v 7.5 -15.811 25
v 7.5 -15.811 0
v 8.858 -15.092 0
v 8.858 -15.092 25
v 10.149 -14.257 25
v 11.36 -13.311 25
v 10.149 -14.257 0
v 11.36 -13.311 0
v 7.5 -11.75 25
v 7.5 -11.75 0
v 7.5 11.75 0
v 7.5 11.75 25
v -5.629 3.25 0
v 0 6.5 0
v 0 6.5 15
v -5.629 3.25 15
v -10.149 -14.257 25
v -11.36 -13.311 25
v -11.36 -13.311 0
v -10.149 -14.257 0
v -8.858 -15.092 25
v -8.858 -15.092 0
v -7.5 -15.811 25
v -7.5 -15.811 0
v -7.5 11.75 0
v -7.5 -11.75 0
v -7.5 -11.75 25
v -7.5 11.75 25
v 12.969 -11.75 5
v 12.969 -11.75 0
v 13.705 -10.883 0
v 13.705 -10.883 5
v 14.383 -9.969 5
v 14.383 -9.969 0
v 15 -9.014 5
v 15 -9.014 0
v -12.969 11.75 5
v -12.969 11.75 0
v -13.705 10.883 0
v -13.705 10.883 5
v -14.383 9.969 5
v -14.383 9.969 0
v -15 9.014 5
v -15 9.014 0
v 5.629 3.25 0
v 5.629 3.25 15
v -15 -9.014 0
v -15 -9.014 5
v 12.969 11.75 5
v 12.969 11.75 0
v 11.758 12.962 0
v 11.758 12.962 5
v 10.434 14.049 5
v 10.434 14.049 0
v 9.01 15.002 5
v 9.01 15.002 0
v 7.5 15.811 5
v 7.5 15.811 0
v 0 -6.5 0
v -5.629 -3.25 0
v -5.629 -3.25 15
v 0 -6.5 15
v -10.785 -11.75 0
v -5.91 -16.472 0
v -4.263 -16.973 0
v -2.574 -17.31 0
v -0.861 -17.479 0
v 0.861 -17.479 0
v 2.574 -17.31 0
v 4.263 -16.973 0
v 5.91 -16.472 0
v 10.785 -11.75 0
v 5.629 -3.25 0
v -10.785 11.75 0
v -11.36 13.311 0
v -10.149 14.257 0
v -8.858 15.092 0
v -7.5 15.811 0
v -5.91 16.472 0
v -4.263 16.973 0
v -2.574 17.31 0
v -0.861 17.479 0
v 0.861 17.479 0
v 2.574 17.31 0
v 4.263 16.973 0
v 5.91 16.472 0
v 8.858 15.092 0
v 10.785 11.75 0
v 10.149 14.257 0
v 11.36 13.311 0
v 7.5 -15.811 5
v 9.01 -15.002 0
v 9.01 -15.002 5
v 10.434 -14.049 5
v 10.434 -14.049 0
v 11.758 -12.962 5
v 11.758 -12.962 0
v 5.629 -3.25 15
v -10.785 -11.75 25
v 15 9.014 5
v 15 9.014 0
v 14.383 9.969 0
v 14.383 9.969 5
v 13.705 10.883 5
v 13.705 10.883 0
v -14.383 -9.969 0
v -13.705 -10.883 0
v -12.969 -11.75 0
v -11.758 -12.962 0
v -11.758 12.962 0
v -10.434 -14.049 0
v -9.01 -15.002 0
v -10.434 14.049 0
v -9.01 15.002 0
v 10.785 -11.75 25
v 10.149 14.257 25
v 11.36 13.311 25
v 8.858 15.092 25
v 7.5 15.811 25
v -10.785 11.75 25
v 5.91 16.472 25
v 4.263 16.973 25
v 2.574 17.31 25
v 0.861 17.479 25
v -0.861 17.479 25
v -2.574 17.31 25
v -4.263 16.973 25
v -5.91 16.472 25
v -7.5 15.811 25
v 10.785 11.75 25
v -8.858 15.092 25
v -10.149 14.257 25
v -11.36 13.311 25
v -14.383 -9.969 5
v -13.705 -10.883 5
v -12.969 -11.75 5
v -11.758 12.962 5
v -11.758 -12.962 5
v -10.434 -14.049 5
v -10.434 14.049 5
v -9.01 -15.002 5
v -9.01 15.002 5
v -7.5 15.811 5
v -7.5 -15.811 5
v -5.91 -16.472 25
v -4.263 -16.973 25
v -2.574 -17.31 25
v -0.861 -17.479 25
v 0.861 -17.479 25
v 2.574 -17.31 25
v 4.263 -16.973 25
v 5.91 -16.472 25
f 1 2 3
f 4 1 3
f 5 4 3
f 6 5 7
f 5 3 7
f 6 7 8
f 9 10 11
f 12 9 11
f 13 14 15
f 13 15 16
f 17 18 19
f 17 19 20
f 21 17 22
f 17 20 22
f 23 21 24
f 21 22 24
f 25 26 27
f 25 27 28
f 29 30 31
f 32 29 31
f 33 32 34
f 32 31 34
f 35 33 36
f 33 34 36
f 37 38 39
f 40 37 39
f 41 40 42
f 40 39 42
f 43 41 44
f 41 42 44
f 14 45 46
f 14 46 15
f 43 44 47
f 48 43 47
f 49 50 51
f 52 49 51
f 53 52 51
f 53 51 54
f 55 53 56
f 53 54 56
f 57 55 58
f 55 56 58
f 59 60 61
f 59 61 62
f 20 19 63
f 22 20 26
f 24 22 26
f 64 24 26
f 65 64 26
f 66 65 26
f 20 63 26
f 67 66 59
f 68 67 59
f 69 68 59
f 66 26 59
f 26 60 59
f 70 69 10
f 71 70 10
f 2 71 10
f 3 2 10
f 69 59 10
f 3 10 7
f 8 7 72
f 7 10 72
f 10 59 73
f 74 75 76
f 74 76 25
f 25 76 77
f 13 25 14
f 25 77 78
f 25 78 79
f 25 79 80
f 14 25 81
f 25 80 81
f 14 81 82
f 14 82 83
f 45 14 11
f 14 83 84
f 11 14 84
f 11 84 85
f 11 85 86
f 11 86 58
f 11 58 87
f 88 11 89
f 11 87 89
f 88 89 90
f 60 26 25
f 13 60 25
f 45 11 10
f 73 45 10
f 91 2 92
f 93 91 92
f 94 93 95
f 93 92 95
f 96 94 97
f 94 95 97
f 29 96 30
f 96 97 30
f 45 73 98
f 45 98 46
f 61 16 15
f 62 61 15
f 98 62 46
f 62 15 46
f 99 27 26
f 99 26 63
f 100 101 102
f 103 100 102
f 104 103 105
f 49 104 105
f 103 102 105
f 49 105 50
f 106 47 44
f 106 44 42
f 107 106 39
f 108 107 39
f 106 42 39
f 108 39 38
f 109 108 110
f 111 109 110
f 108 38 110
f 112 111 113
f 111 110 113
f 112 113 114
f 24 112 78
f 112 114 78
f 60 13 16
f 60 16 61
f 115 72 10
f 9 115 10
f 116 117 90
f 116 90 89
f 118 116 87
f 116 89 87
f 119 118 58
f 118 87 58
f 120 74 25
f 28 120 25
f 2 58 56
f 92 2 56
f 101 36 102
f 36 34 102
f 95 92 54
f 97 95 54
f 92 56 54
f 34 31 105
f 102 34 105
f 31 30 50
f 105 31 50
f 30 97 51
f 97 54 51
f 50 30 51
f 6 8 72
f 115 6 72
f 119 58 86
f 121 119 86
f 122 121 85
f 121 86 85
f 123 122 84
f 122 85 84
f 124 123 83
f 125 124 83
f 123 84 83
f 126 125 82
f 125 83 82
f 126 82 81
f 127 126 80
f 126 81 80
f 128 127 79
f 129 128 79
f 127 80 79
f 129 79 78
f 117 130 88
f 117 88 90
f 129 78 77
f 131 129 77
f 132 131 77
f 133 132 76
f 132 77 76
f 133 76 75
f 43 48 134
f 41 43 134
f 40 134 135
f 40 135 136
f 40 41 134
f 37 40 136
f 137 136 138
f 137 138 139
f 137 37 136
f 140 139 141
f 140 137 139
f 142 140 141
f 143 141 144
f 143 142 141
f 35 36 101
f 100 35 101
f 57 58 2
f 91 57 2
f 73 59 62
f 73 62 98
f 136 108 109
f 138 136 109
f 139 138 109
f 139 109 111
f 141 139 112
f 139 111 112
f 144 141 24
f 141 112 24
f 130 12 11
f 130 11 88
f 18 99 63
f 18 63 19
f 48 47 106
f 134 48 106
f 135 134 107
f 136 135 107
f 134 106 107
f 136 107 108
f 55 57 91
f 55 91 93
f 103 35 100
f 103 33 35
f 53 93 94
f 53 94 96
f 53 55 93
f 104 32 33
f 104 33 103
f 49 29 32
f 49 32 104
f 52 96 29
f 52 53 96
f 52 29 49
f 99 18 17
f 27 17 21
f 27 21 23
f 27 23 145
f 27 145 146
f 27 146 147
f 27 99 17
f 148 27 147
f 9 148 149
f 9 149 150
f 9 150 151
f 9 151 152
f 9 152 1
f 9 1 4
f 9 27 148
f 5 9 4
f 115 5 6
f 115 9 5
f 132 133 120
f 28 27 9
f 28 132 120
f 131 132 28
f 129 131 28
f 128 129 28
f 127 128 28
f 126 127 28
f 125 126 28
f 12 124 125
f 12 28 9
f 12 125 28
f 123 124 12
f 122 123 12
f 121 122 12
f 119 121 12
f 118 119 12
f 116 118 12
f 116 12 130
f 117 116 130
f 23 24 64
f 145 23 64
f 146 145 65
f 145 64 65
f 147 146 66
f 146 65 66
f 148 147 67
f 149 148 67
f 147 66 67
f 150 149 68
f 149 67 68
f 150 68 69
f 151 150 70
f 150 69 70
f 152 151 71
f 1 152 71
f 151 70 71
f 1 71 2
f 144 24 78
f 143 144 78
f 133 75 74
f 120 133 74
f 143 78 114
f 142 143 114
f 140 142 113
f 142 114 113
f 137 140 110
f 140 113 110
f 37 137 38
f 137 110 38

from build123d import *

# Parameters (mm, degrees)
F1_DEPTH    = 5
F0_W        = 15
F0_H        = 23.5
F2_DEPTH    = 25
F3_T1_DEPTH = 36.3750267574
F4_DEPTH    = 15


# Not quite as in the source:
# - a fillet or chamfer that OpenCascade refuses, or shapes differently, is made with other operations: its cross-section is extruded or revolved along the edge and cut away or added
# - a feature names something its author has since deleted; it is built from what else it names


with BuildPart() as f1:
    # F0 (on Top) → F1 (new body)
    with BuildSketch(Plane.XY):
        with BuildLine():
            Line((15, -9.0138781887), (15, 9.0138781887))
            ThreePointArc((15, 9.0138781887), (14.0511141288, 10.4314999755), (12.9687123493, 11.75))
            Line((12.9687123493, 11.75), (7.5, 11.75))
            Line((7.5, 11.75), (7.5, -11.75))
            Line((7.5, -11.75), (12.9687123493, -11.75))
            ThreePointArc((12.9687123493, -11.75), (14.0511141288, -10.4314999755), (15, -9.0138781887))
        make_face()
        with BuildLine():
            ThreePointArc((7.5, -15.8113883008), (10.4338758399, -14.0493499834), (12.9687123493, -11.75))
            Line((12.9687123493, -11.75), (7.5, -11.75))
            Line((7.5, -11.75), (7.5, -15.8113883008))
        make_face()
        with BuildLine():
            Line((7.5, 11.75), (12.9687123493, 11.75))
            ThreePointArc((12.9687123493, 11.75), (10.4338758399, 14.0493499834), (7.5, 15.8113883008))
            Line((7.5, 15.8113883008), (7.5, 11.75))
        make_face()
    extrude(amount=F1_DEPTH)


with BuildPart() as f1b:
    # F0 (on Top) → F1, piece 2 (new body)
    with BuildSketch(Plane.XY):
        with BuildLine():
            Line((-7.5, -11.75), (-7.5, 11.75))
            Line((-7.5, 11.75), (-12.9687123493, 11.75))
            ThreePointArc((-12.9687123493, 11.75), (-14.0511141288, 10.4314999755), (-15, 9.0138781887))
            Line((-15, 9.0138781887), (-15, -9.0138781887))
            ThreePointArc((-15, -9.0138781887), (-14.0511141288, -10.4314999755), (-12.9687123493, -11.75))
            Line((-12.9687123493, -11.75), (-7.5, -11.75))
        make_face()
        with BuildLine():
            Line((-7.5, 11.75), (-7.5, 15.8113883008))
            ThreePointArc((-7.5, 15.8113883008), (-10.4338758399, 14.0493499834), (-12.9687123493, 11.75))
            Line((-12.9687123493, 11.75), (-7.5, 11.75))
        make_face()
        with BuildLine():
            ThreePointArc((-12.9687123493, -11.75), (-10.4338758399, -14.0493499834), (-7.5, -15.8113883008))
            Line((-7.5, -15.8113883008), (-7.5, -11.75))
            Line((-7.5, -11.75), (-12.9687123493, -11.75))
        make_face()
    extrude(amount=F1_DEPTH)


with BuildPart() as f2:
    # F0 (on Top) → F2 (new body)
    with BuildSketch(Plane.XY):
        Rectangle(F0_W, F0_H)
        Polygon((-5.6291651246, 3.25), (0, 6.5), (5.6291651246, 3.25), (5.6291651246, -3.25), (0, -6.5), (-5.6291651246, -3.25), align=None, mode=Mode.SUBTRACT)
        with BuildLine():
            ThreePointArc((-12.9687123493, -11.75), (-10.4338758399, -14.0493499834), (-7.5, -15.8113883008))
            Line((-7.5, -15.8113883008), (-7.5, -11.75))
            Line((-7.5, -11.75), (-12.9687123493, -11.75))
        make_face()
        with BuildLine():
            Line((-7.5, 11.75), (-7.5, 15.8113883008))
            ThreePointArc((-7.5, 15.8113883008), (-10.4338758399, 14.0493499834), (-12.9687123493, 11.75))
            Line((-12.9687123493, 11.75), (-7.5, 11.75))
        make_face()
        with BuildLine():
            Line((7.5, 11.75), (12.9687123493, 11.75))
            ThreePointArc((12.9687123493, 11.75), (10.4338758399, 14.0493499834), (7.5, 15.8113883008))
            Line((7.5, 15.8113883008), (7.5, 11.75))
        make_face()
        with BuildLine():
            ThreePointArc((7.5, -15.8113883008), (10.4338758399, -14.0493499834), (12.9687123493, -11.75))
            Line((12.9687123493, -11.75), (7.5, -11.75))
            Line((7.5, -11.75), (7.5, -15.8113883008))
        make_face()
        with BuildLine():
            Line((7.5, 11.75), (7.5, 15.8113883008))
            ThreePointArc((7.5, 15.8113883008), (0, 17.5), (-7.5, 15.8113883008))
            Line((-7.5, 15.8113883008), (-7.5, 11.75))
            Line((-7.5, 11.75), (7.5, 11.75))
        make_face()
        with BuildLine():
            ThreePointArc((-7.5, -15.8113883008), (0, -17.5), (7.5, -15.8113883008))
            Line((7.5, -15.8113883008), (7.5, -11.75))
            Line((7.5, -11.75), (-7.5, -11.75))
            Line((-7.5, -11.75), (-7.5, -15.8113883008))
        make_face()
        Polygon((5.6291651246, 3.25), (0, 6.5), (-5.6291651246, 3.25), (-5.6291651246, -3.25), (0, -6.5), (5.6291651246, -3.25), align=None)
    extrude(amount=F2_DEPTH)

    # F3: chamfer of 2 on 4 edges, made by hand

    # F3_s2 → F3_t1 (cut)
    with BuildSketch(Plane.XY.offset(-5.6875133787)):
        with BuildLine():
            Line((-10.7571586121, -11.6749396443), (-11.3881617362, -13.3863096005))
            Line((-11.3881617362, -13.3863096005), (-11.4141285615, -13.4167353131))
            ThreePointArc((-11.4141285615, -13.4167353131), (-12.2058182488, -12.5964122224), (-12.9983551204, -11.7768571429))
            Line((-12.9983551204, -11.7768571429), (-12.9687123493, -11.71))
            ThreePointArc((-12.9687123493, -11.71), (-11.8629354807, -11.71), (-10.7571586121, -11.6349396443))
            Line((-10.7571586121, -11.6349396443), (-10.7571586121, -11.6749396443))
        make_face()
        with BuildLine():
            Line((11.3881617362, -13.3863096005), (10.7571586121, -11.6749396443))
            Line((10.7571586121, -11.6749396443), (10.7571586121, -11.6349396443))
            ThreePointArc((10.7571586121, -11.6349396443), (11.8629354807, -11.71), (12.9687123493, -11.71))
            Line((12.9687123493, -11.71), (12.9983551204, -11.7768571429))
            ThreePointArc((12.9983551204, -11.7768571429), (12.2058182488, -12.5964122224), (11.4141285615, -13.4167353131))
            Line((11.4141285615, -13.4167353131), (11.3881617362, -13.3863096005))
        make_face()
        with BuildLine():
            Line((10.7571586121, 11.6749396443), (11.3881617362, 13.3863096005))
            Line((11.3881617362, 13.3863096005), (11.4141285615, 13.4167353131))
            ThreePointArc((11.4141285615, 13.4167353131), (12.2058182488, 12.5964122224), (12.9983551204, 11.7768571429))
            Line((12.9983551204, 11.7768571429), (12.9687123493, 11.71))
            ThreePointArc((12.9687123493, 11.71), (11.8629354807, 11.71), (10.7571586121, 11.6349396443))
            Line((10.7571586121, 11.6349396443), (10.7571586121, 11.6749396443))
        make_face()
        with BuildLine():
            Line((-11.3881617362, 13.3863096005), (-10.7571586121, 11.6749396443))
            Line((-10.7571586121, 11.6749396443), (-10.7571586121, 11.6349396443))
            ThreePointArc((-10.7571586121, 11.6349396443), (-11.8629354807, 11.71), (-12.9687123493, 11.71))
            Line((-12.9687123493, 11.71), (-12.9983551204, 11.7768571429))
            ThreePointArc((-12.9983551204, 11.7768571429), (-12.2058182488, 12.5964122224), (-11.4141285615, 13.4167353131))
            Line((-11.4141285615, 13.4167353131), (-11.3881617362, 13.3863096005))
        make_face()
    extrude(amount=F3_T1_DEPTH, mode=Mode.SUBTRACT)

    # F0 (on Top) → F4 (cut)
    with BuildSketch(Plane.XY):
        Polygon((5.6291651246, 3.25), (0, 6.5), (-5.6291651246, 3.25), (-5.6291651246, -3.25), (0, -6.5), (5.6291651246, -3.25), align=None)
    extrude(amount=F4_DEPTH, mode=Mode.SUBTRACT)


solid = Compound([f1.part, f1b.part, f2.part])
